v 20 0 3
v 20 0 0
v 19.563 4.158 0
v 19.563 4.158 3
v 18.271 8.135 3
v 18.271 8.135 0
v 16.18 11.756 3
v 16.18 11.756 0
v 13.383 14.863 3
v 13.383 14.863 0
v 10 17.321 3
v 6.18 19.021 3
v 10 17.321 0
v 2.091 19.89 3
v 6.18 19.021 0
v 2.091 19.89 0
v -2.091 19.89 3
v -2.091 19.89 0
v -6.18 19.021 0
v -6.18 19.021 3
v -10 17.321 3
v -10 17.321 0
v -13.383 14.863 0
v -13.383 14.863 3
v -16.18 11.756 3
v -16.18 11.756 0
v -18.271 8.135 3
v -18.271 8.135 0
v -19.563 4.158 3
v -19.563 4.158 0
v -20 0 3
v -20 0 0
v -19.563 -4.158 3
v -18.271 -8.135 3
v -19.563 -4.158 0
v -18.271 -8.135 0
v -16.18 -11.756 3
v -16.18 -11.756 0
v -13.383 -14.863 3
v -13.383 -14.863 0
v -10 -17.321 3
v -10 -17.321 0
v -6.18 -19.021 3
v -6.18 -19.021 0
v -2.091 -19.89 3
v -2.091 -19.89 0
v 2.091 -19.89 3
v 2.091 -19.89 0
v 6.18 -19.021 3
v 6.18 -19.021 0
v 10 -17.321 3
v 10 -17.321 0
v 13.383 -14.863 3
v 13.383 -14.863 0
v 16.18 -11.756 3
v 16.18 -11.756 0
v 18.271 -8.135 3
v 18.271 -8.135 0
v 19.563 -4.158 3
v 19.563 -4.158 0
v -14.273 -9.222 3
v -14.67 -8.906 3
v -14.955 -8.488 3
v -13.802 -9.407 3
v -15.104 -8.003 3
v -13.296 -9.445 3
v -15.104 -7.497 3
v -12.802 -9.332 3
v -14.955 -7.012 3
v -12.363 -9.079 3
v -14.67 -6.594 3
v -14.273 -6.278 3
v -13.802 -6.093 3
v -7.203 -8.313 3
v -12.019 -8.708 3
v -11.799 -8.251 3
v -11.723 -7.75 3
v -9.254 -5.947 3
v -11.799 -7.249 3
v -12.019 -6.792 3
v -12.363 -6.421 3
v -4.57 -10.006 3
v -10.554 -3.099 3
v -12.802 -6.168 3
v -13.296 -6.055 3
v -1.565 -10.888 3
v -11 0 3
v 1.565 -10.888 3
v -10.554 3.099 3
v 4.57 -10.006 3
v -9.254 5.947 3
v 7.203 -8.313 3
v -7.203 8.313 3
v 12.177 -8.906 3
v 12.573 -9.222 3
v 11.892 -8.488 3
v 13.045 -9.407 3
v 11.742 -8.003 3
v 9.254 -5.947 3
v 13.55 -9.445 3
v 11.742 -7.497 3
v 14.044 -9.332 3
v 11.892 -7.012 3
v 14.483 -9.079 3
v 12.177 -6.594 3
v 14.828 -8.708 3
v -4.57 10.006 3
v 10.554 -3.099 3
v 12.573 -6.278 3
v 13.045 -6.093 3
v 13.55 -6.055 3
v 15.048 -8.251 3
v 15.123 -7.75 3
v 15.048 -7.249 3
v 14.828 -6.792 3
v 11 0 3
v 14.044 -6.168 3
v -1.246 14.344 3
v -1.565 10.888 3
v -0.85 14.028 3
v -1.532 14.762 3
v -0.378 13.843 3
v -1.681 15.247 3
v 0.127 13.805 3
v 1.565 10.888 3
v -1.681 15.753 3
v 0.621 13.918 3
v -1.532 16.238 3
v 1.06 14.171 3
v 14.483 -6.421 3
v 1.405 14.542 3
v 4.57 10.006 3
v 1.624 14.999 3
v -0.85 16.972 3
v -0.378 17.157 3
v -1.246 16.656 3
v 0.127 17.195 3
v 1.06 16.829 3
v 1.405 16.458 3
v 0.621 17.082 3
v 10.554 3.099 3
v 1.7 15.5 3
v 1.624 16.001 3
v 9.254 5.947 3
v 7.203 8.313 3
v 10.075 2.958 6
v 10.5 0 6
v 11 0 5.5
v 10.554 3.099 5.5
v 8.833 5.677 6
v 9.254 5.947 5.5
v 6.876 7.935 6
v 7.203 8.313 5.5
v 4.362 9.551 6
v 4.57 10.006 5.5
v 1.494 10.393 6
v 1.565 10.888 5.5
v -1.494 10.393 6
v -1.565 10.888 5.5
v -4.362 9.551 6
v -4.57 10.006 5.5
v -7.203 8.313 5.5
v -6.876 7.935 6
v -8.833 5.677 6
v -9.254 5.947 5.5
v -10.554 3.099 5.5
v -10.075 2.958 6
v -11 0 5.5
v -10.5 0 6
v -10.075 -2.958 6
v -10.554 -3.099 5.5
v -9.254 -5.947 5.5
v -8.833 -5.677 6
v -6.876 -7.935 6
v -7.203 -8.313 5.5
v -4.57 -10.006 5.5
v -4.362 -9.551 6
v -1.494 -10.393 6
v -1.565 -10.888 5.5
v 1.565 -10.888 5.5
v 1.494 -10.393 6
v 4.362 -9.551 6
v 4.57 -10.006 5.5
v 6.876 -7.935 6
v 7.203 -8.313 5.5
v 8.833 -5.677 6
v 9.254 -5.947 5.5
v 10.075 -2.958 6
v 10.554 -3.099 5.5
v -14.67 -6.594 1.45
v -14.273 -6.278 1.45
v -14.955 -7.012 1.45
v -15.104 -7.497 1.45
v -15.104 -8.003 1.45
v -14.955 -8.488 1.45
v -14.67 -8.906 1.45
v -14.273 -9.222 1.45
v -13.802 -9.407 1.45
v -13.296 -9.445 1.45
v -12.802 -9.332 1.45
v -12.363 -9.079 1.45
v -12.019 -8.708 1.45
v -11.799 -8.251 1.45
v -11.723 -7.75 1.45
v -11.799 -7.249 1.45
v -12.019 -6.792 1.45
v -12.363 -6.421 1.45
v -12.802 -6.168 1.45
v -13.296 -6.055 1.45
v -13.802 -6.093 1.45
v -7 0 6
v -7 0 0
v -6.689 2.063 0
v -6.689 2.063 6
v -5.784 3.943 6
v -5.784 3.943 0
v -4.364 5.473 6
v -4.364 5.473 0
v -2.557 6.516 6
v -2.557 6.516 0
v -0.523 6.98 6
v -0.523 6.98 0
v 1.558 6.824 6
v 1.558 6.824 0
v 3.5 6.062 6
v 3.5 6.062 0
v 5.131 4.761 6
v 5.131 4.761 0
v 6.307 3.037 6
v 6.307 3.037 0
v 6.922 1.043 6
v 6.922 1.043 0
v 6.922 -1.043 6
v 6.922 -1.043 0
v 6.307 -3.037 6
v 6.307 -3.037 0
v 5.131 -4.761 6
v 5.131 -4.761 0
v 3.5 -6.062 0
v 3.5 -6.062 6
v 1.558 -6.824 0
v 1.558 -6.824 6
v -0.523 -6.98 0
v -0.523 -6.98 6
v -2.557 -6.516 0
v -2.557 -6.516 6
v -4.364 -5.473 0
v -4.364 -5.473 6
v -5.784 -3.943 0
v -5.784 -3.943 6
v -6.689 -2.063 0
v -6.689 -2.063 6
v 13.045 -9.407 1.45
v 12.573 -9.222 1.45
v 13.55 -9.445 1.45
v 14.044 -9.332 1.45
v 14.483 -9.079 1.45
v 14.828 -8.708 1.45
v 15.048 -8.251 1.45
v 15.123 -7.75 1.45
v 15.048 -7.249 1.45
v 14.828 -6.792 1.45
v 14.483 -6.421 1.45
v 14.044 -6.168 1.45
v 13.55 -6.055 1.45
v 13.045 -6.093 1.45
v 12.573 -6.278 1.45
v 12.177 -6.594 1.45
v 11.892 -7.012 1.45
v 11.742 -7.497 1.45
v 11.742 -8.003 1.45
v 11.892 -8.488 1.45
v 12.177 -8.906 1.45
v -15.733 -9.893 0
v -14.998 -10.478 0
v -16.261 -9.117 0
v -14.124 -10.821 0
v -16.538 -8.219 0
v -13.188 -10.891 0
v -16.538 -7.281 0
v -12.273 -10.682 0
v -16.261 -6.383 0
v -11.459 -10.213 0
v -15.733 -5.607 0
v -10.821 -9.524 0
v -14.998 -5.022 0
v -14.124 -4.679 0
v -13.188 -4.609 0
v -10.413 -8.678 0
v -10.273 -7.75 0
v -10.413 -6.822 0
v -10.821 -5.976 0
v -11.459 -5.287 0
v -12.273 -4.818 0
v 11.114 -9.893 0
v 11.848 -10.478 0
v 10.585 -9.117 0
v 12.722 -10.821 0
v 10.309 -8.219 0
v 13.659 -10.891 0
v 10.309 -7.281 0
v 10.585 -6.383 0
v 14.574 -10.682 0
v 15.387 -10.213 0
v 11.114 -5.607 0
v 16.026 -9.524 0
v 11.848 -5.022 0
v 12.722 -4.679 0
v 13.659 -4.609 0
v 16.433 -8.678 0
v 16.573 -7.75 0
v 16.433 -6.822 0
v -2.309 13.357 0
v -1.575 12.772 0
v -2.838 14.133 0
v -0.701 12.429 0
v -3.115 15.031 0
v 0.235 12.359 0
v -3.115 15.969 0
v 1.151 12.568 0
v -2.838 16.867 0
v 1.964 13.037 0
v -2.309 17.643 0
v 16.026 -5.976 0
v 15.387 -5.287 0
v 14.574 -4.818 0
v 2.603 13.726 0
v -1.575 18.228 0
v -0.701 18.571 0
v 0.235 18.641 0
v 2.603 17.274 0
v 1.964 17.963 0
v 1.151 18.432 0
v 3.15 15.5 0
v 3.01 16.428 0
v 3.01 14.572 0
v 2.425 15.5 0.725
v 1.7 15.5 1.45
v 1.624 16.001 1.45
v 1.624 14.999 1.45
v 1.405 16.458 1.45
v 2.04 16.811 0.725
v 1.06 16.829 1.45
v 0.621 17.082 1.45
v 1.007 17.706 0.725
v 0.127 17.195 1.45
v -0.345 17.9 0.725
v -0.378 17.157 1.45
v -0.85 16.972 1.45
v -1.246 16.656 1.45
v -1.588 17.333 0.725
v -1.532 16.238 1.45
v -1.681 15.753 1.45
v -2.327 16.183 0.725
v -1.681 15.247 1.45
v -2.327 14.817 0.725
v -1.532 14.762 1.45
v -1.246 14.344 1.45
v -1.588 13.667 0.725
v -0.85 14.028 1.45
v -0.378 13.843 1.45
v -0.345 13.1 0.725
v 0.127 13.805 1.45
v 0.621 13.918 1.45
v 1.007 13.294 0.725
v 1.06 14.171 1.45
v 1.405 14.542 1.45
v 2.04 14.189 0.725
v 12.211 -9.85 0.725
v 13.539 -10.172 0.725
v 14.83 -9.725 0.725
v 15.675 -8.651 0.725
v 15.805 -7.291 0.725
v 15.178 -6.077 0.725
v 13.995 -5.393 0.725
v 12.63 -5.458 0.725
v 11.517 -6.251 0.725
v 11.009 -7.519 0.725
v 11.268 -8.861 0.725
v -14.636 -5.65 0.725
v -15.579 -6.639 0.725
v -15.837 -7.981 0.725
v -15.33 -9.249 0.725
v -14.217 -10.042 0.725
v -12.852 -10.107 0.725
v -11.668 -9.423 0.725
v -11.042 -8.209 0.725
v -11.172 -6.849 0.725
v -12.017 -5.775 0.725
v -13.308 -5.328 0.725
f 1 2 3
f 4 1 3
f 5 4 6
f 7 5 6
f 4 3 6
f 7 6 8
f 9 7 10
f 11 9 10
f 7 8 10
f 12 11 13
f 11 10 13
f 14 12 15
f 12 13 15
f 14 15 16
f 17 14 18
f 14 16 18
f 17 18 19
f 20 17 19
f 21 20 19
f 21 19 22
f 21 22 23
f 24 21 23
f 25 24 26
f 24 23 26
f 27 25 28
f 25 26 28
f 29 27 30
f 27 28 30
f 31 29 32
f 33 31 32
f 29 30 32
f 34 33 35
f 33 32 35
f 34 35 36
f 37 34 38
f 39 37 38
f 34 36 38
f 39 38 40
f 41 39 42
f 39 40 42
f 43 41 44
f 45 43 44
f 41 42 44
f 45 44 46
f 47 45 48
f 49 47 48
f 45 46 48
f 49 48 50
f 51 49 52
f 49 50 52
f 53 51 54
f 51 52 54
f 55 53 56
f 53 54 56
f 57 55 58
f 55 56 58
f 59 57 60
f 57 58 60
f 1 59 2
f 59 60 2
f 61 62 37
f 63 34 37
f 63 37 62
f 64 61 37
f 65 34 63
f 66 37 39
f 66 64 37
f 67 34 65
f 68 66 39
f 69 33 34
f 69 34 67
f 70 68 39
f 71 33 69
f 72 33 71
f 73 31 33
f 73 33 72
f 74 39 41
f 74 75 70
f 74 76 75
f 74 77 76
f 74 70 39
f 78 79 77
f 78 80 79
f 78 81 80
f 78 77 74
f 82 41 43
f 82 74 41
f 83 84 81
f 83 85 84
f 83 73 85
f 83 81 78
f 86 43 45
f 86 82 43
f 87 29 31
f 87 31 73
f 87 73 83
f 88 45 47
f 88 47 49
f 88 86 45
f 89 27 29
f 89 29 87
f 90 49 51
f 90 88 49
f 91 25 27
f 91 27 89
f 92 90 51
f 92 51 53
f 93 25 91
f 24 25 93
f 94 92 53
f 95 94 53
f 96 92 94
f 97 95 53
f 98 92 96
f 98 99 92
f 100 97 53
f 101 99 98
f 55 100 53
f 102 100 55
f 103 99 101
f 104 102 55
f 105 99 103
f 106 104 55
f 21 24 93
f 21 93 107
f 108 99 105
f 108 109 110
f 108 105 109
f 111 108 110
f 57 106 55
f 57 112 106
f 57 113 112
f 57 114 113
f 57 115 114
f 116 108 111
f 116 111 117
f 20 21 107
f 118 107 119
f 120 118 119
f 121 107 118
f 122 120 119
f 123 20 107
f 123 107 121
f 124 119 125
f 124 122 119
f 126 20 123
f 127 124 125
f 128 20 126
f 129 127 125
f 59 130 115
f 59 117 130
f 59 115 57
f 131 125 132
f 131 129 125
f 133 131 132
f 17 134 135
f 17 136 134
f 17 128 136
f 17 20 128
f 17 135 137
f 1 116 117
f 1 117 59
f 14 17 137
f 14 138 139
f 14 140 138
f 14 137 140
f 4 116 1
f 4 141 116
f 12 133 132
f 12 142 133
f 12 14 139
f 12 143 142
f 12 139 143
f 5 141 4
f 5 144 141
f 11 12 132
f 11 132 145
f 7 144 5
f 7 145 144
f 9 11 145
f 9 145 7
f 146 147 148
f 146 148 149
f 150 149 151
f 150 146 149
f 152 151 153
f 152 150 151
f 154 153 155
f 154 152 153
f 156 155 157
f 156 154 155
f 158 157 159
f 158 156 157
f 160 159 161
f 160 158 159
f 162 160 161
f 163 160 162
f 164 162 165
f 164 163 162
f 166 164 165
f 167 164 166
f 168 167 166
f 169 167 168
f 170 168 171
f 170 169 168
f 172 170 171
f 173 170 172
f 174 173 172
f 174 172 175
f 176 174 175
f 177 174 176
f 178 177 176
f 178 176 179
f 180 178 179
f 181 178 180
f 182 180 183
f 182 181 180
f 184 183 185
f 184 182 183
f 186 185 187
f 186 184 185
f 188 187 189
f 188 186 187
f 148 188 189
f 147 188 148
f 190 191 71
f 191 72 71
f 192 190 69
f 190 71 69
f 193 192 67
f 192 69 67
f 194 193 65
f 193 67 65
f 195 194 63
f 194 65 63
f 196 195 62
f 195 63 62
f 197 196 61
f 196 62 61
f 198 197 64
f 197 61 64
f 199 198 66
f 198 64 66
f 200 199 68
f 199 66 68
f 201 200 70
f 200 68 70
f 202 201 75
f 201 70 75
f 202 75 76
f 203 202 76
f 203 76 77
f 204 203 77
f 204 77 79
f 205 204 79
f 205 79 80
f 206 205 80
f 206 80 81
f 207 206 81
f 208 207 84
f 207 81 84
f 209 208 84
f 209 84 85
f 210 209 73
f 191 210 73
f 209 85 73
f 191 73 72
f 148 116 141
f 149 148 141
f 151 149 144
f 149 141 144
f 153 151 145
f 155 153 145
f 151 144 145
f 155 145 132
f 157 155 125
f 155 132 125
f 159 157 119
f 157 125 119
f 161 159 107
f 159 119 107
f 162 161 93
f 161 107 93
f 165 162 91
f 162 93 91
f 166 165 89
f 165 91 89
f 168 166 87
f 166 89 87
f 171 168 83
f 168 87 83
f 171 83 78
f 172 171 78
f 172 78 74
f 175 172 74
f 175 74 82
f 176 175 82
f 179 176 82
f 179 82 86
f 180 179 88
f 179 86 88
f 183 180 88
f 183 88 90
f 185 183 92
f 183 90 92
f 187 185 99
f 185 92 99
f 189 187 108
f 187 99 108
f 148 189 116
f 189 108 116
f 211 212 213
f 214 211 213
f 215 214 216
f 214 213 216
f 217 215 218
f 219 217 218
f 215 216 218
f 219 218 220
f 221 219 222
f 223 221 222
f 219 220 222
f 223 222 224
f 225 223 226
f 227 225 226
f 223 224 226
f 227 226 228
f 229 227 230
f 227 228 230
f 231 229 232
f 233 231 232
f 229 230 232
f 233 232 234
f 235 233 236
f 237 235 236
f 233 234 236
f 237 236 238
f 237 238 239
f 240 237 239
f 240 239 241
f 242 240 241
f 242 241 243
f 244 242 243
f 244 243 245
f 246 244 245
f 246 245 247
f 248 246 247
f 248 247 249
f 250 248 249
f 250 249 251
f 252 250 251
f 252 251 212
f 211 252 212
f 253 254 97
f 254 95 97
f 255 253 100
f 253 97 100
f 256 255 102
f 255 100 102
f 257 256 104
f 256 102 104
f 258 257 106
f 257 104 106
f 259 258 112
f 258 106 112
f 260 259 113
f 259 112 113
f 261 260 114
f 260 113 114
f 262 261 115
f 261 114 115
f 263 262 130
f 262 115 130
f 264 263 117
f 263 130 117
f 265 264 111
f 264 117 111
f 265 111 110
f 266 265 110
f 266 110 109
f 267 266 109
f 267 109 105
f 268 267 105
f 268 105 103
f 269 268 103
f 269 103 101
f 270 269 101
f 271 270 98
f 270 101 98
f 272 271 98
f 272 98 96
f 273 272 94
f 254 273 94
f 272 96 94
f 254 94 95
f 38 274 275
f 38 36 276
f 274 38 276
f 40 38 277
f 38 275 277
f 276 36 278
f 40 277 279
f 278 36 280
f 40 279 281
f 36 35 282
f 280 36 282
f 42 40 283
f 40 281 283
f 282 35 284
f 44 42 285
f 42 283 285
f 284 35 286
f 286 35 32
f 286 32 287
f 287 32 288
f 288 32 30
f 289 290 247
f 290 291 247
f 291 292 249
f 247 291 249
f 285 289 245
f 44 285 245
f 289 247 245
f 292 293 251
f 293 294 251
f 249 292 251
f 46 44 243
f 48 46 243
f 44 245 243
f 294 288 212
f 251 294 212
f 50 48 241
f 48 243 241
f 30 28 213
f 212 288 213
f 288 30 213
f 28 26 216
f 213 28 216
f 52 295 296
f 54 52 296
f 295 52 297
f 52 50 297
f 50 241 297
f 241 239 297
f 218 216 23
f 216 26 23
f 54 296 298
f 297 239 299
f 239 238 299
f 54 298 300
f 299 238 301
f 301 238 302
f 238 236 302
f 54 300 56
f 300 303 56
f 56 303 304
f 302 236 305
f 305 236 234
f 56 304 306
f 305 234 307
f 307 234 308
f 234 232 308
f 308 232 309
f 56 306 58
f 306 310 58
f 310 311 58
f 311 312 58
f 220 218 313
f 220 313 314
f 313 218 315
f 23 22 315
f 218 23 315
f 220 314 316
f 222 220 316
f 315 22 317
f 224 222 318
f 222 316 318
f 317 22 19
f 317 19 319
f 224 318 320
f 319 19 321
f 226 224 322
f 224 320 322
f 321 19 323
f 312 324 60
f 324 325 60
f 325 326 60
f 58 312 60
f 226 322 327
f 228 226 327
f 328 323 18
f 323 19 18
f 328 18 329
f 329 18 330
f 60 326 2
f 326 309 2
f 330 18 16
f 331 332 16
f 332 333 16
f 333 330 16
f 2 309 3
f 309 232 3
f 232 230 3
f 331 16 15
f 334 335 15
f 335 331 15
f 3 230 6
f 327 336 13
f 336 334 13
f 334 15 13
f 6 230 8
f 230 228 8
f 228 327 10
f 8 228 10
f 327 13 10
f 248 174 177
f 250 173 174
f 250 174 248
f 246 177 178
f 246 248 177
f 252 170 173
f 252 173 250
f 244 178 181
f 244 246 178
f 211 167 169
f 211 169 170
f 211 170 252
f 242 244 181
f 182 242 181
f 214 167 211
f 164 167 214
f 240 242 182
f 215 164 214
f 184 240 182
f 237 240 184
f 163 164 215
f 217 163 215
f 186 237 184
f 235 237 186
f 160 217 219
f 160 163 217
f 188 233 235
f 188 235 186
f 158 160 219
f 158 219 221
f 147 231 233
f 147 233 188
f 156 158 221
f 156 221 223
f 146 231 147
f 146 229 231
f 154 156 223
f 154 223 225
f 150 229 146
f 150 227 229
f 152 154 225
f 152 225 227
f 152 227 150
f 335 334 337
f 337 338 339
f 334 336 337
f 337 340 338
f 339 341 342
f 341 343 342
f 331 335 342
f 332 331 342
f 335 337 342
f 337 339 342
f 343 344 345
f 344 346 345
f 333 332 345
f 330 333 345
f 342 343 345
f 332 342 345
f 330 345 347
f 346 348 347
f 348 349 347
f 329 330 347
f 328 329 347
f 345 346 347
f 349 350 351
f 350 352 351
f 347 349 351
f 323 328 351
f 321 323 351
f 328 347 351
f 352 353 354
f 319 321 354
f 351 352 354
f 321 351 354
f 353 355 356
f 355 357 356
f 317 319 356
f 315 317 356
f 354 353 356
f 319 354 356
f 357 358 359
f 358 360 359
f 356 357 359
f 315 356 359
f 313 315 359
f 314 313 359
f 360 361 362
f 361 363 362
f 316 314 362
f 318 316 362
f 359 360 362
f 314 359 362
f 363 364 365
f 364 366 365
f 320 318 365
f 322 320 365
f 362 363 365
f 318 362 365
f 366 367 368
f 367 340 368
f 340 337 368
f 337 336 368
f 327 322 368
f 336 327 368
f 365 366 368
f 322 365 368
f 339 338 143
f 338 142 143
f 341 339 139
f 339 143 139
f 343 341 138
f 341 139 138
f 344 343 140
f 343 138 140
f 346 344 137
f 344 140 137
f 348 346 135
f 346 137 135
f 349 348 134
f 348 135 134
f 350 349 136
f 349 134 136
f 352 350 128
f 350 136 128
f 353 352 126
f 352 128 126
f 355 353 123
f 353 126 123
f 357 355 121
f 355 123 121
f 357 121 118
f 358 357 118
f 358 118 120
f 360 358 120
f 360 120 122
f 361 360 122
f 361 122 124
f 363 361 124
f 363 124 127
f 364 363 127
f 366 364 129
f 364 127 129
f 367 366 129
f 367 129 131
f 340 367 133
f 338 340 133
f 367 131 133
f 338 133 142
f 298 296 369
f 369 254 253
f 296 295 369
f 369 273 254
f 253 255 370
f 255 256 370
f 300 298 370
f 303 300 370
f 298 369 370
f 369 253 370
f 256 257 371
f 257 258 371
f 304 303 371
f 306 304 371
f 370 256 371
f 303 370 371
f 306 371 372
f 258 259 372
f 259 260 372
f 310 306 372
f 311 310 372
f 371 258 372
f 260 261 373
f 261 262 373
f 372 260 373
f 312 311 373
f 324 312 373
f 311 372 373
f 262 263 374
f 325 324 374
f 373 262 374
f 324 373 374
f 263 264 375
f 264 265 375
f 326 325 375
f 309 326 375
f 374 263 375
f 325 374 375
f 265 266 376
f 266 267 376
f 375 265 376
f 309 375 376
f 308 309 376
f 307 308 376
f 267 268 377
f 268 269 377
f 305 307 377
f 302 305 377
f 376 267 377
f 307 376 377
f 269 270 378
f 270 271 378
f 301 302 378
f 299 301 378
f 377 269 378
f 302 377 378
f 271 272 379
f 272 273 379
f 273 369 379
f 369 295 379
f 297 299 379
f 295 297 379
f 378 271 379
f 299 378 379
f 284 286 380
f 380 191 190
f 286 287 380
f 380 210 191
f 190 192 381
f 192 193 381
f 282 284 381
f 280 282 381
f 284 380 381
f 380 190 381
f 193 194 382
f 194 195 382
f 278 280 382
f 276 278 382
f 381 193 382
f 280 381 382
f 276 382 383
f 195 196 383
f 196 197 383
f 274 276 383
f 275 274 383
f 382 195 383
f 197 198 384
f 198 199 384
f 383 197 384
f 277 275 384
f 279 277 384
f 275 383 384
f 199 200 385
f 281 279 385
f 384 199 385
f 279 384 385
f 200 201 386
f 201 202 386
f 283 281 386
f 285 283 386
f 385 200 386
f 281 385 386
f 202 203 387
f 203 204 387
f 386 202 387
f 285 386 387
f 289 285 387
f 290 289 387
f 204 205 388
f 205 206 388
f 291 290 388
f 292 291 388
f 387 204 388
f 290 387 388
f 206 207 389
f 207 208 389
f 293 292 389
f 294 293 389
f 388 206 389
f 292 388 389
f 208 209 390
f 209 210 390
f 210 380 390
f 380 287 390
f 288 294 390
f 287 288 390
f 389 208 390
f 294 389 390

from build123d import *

# Parameters (mm, degrees)
ESQUISSE1_R                                    = 20
BOSS_EXTRU_1_DEPTH                             = 3
ESQUISSE2_R                                    = 11
BOSS_EXTRU_2_DEPTH                             = 3
CHANFREIN1_SIZE                                = 0.5
ESQUISSE3_R                                    = 7
ENL_V_MAT_EXTRU_1_DEPTH                        = 7
FRAISAGE_POUR_VIS_T_TE_FRAIS_E_M32_D           = 3.4
FRAISAGE_POUR_VIS_T_TE_FRAIS_E_M32_CSINK_D     = 6.3
FRAISAGE_POUR_VIS_T_TE_FRAIS_E_M32_CSINK_ANGLE = 90
R_P_TITION_CIRCULAIRE1_COUNT                   = 3


with BuildPart() as part:
    # Esquisse1 → Boss.-Extru.1 (new body)
    with BuildSketch(Plane.XY):
        Circle(ESQUISSE1_R)
    extrude(amount=BOSS_EXTRU_1_DEPTH)

    # Esquisse2 → Boss.-Extru.2 (add)
    with BuildSketch(Plane.XY.offset(3)):
        Circle(ESQUISSE2_R)
    extrude(amount=BOSS_EXTRU_2_DEPTH)

    # Chanfrein1
    chanfrein1_edges = [part.edges().sort_by_distance(p)[0] for p in [
        (-11, 0, 6),
    ]]
    chamfer(chanfrein1_edges, length=CHANFREIN1_SIZE)

    # Esquisse3 → Enlèv. mat.-Extru.1 (cut, through all)
    with BuildSketch(Plane(origin=(0, 0, 0), x_dir=(-1, 0, 0), z_dir=(0, 0, -1))):
        Circle(ESQUISSE3_R)
    extrude(amount=-ENL_V_MAT_EXTRU_1_DEPTH, mode=Mode.SUBTRACT)

    # Fraisage pour vis à tête fraisée M32 (through all)
    with Locations(Plane(origin=(0, 0, 0), x_dir=(-1, 0, 0), z_dir=(0, 0, -1))):
        with Locations((0, 15.5)):
            fraisage_pour_vis_t_te_frais_e_m32 = CounterSinkHole(FRAISAGE_POUR_VIS_T_TE_FRAIS_E_M32_D / 2, FRAISAGE_POUR_VIS_T_TE_FRAIS_E_M32_CSINK_D / 2, counter_sink_angle=FRAISAGE_POUR_VIS_T_TE_FRAIS_E_M32_CSINK_ANGLE)

    # Répétition circulaire1: Fraisage pour vis à tête fraisée M32 ×3 about axis
    r_p_tition_circulaire1_axis = Axis((0, 0, 0), (0, 0, 1))
    for i in range(1, R_P_TITION_CIRCULAIRE1_COUNT):
        add(fraisage_pour_vis_t_te_frais_e_m32.rotate(r_p_tition_circulaire1_axis, i * 360 / R_P_TITION_CIRCULAIRE1_COUNT), mode=Mode.SUBTRACT)


solid = part.part
